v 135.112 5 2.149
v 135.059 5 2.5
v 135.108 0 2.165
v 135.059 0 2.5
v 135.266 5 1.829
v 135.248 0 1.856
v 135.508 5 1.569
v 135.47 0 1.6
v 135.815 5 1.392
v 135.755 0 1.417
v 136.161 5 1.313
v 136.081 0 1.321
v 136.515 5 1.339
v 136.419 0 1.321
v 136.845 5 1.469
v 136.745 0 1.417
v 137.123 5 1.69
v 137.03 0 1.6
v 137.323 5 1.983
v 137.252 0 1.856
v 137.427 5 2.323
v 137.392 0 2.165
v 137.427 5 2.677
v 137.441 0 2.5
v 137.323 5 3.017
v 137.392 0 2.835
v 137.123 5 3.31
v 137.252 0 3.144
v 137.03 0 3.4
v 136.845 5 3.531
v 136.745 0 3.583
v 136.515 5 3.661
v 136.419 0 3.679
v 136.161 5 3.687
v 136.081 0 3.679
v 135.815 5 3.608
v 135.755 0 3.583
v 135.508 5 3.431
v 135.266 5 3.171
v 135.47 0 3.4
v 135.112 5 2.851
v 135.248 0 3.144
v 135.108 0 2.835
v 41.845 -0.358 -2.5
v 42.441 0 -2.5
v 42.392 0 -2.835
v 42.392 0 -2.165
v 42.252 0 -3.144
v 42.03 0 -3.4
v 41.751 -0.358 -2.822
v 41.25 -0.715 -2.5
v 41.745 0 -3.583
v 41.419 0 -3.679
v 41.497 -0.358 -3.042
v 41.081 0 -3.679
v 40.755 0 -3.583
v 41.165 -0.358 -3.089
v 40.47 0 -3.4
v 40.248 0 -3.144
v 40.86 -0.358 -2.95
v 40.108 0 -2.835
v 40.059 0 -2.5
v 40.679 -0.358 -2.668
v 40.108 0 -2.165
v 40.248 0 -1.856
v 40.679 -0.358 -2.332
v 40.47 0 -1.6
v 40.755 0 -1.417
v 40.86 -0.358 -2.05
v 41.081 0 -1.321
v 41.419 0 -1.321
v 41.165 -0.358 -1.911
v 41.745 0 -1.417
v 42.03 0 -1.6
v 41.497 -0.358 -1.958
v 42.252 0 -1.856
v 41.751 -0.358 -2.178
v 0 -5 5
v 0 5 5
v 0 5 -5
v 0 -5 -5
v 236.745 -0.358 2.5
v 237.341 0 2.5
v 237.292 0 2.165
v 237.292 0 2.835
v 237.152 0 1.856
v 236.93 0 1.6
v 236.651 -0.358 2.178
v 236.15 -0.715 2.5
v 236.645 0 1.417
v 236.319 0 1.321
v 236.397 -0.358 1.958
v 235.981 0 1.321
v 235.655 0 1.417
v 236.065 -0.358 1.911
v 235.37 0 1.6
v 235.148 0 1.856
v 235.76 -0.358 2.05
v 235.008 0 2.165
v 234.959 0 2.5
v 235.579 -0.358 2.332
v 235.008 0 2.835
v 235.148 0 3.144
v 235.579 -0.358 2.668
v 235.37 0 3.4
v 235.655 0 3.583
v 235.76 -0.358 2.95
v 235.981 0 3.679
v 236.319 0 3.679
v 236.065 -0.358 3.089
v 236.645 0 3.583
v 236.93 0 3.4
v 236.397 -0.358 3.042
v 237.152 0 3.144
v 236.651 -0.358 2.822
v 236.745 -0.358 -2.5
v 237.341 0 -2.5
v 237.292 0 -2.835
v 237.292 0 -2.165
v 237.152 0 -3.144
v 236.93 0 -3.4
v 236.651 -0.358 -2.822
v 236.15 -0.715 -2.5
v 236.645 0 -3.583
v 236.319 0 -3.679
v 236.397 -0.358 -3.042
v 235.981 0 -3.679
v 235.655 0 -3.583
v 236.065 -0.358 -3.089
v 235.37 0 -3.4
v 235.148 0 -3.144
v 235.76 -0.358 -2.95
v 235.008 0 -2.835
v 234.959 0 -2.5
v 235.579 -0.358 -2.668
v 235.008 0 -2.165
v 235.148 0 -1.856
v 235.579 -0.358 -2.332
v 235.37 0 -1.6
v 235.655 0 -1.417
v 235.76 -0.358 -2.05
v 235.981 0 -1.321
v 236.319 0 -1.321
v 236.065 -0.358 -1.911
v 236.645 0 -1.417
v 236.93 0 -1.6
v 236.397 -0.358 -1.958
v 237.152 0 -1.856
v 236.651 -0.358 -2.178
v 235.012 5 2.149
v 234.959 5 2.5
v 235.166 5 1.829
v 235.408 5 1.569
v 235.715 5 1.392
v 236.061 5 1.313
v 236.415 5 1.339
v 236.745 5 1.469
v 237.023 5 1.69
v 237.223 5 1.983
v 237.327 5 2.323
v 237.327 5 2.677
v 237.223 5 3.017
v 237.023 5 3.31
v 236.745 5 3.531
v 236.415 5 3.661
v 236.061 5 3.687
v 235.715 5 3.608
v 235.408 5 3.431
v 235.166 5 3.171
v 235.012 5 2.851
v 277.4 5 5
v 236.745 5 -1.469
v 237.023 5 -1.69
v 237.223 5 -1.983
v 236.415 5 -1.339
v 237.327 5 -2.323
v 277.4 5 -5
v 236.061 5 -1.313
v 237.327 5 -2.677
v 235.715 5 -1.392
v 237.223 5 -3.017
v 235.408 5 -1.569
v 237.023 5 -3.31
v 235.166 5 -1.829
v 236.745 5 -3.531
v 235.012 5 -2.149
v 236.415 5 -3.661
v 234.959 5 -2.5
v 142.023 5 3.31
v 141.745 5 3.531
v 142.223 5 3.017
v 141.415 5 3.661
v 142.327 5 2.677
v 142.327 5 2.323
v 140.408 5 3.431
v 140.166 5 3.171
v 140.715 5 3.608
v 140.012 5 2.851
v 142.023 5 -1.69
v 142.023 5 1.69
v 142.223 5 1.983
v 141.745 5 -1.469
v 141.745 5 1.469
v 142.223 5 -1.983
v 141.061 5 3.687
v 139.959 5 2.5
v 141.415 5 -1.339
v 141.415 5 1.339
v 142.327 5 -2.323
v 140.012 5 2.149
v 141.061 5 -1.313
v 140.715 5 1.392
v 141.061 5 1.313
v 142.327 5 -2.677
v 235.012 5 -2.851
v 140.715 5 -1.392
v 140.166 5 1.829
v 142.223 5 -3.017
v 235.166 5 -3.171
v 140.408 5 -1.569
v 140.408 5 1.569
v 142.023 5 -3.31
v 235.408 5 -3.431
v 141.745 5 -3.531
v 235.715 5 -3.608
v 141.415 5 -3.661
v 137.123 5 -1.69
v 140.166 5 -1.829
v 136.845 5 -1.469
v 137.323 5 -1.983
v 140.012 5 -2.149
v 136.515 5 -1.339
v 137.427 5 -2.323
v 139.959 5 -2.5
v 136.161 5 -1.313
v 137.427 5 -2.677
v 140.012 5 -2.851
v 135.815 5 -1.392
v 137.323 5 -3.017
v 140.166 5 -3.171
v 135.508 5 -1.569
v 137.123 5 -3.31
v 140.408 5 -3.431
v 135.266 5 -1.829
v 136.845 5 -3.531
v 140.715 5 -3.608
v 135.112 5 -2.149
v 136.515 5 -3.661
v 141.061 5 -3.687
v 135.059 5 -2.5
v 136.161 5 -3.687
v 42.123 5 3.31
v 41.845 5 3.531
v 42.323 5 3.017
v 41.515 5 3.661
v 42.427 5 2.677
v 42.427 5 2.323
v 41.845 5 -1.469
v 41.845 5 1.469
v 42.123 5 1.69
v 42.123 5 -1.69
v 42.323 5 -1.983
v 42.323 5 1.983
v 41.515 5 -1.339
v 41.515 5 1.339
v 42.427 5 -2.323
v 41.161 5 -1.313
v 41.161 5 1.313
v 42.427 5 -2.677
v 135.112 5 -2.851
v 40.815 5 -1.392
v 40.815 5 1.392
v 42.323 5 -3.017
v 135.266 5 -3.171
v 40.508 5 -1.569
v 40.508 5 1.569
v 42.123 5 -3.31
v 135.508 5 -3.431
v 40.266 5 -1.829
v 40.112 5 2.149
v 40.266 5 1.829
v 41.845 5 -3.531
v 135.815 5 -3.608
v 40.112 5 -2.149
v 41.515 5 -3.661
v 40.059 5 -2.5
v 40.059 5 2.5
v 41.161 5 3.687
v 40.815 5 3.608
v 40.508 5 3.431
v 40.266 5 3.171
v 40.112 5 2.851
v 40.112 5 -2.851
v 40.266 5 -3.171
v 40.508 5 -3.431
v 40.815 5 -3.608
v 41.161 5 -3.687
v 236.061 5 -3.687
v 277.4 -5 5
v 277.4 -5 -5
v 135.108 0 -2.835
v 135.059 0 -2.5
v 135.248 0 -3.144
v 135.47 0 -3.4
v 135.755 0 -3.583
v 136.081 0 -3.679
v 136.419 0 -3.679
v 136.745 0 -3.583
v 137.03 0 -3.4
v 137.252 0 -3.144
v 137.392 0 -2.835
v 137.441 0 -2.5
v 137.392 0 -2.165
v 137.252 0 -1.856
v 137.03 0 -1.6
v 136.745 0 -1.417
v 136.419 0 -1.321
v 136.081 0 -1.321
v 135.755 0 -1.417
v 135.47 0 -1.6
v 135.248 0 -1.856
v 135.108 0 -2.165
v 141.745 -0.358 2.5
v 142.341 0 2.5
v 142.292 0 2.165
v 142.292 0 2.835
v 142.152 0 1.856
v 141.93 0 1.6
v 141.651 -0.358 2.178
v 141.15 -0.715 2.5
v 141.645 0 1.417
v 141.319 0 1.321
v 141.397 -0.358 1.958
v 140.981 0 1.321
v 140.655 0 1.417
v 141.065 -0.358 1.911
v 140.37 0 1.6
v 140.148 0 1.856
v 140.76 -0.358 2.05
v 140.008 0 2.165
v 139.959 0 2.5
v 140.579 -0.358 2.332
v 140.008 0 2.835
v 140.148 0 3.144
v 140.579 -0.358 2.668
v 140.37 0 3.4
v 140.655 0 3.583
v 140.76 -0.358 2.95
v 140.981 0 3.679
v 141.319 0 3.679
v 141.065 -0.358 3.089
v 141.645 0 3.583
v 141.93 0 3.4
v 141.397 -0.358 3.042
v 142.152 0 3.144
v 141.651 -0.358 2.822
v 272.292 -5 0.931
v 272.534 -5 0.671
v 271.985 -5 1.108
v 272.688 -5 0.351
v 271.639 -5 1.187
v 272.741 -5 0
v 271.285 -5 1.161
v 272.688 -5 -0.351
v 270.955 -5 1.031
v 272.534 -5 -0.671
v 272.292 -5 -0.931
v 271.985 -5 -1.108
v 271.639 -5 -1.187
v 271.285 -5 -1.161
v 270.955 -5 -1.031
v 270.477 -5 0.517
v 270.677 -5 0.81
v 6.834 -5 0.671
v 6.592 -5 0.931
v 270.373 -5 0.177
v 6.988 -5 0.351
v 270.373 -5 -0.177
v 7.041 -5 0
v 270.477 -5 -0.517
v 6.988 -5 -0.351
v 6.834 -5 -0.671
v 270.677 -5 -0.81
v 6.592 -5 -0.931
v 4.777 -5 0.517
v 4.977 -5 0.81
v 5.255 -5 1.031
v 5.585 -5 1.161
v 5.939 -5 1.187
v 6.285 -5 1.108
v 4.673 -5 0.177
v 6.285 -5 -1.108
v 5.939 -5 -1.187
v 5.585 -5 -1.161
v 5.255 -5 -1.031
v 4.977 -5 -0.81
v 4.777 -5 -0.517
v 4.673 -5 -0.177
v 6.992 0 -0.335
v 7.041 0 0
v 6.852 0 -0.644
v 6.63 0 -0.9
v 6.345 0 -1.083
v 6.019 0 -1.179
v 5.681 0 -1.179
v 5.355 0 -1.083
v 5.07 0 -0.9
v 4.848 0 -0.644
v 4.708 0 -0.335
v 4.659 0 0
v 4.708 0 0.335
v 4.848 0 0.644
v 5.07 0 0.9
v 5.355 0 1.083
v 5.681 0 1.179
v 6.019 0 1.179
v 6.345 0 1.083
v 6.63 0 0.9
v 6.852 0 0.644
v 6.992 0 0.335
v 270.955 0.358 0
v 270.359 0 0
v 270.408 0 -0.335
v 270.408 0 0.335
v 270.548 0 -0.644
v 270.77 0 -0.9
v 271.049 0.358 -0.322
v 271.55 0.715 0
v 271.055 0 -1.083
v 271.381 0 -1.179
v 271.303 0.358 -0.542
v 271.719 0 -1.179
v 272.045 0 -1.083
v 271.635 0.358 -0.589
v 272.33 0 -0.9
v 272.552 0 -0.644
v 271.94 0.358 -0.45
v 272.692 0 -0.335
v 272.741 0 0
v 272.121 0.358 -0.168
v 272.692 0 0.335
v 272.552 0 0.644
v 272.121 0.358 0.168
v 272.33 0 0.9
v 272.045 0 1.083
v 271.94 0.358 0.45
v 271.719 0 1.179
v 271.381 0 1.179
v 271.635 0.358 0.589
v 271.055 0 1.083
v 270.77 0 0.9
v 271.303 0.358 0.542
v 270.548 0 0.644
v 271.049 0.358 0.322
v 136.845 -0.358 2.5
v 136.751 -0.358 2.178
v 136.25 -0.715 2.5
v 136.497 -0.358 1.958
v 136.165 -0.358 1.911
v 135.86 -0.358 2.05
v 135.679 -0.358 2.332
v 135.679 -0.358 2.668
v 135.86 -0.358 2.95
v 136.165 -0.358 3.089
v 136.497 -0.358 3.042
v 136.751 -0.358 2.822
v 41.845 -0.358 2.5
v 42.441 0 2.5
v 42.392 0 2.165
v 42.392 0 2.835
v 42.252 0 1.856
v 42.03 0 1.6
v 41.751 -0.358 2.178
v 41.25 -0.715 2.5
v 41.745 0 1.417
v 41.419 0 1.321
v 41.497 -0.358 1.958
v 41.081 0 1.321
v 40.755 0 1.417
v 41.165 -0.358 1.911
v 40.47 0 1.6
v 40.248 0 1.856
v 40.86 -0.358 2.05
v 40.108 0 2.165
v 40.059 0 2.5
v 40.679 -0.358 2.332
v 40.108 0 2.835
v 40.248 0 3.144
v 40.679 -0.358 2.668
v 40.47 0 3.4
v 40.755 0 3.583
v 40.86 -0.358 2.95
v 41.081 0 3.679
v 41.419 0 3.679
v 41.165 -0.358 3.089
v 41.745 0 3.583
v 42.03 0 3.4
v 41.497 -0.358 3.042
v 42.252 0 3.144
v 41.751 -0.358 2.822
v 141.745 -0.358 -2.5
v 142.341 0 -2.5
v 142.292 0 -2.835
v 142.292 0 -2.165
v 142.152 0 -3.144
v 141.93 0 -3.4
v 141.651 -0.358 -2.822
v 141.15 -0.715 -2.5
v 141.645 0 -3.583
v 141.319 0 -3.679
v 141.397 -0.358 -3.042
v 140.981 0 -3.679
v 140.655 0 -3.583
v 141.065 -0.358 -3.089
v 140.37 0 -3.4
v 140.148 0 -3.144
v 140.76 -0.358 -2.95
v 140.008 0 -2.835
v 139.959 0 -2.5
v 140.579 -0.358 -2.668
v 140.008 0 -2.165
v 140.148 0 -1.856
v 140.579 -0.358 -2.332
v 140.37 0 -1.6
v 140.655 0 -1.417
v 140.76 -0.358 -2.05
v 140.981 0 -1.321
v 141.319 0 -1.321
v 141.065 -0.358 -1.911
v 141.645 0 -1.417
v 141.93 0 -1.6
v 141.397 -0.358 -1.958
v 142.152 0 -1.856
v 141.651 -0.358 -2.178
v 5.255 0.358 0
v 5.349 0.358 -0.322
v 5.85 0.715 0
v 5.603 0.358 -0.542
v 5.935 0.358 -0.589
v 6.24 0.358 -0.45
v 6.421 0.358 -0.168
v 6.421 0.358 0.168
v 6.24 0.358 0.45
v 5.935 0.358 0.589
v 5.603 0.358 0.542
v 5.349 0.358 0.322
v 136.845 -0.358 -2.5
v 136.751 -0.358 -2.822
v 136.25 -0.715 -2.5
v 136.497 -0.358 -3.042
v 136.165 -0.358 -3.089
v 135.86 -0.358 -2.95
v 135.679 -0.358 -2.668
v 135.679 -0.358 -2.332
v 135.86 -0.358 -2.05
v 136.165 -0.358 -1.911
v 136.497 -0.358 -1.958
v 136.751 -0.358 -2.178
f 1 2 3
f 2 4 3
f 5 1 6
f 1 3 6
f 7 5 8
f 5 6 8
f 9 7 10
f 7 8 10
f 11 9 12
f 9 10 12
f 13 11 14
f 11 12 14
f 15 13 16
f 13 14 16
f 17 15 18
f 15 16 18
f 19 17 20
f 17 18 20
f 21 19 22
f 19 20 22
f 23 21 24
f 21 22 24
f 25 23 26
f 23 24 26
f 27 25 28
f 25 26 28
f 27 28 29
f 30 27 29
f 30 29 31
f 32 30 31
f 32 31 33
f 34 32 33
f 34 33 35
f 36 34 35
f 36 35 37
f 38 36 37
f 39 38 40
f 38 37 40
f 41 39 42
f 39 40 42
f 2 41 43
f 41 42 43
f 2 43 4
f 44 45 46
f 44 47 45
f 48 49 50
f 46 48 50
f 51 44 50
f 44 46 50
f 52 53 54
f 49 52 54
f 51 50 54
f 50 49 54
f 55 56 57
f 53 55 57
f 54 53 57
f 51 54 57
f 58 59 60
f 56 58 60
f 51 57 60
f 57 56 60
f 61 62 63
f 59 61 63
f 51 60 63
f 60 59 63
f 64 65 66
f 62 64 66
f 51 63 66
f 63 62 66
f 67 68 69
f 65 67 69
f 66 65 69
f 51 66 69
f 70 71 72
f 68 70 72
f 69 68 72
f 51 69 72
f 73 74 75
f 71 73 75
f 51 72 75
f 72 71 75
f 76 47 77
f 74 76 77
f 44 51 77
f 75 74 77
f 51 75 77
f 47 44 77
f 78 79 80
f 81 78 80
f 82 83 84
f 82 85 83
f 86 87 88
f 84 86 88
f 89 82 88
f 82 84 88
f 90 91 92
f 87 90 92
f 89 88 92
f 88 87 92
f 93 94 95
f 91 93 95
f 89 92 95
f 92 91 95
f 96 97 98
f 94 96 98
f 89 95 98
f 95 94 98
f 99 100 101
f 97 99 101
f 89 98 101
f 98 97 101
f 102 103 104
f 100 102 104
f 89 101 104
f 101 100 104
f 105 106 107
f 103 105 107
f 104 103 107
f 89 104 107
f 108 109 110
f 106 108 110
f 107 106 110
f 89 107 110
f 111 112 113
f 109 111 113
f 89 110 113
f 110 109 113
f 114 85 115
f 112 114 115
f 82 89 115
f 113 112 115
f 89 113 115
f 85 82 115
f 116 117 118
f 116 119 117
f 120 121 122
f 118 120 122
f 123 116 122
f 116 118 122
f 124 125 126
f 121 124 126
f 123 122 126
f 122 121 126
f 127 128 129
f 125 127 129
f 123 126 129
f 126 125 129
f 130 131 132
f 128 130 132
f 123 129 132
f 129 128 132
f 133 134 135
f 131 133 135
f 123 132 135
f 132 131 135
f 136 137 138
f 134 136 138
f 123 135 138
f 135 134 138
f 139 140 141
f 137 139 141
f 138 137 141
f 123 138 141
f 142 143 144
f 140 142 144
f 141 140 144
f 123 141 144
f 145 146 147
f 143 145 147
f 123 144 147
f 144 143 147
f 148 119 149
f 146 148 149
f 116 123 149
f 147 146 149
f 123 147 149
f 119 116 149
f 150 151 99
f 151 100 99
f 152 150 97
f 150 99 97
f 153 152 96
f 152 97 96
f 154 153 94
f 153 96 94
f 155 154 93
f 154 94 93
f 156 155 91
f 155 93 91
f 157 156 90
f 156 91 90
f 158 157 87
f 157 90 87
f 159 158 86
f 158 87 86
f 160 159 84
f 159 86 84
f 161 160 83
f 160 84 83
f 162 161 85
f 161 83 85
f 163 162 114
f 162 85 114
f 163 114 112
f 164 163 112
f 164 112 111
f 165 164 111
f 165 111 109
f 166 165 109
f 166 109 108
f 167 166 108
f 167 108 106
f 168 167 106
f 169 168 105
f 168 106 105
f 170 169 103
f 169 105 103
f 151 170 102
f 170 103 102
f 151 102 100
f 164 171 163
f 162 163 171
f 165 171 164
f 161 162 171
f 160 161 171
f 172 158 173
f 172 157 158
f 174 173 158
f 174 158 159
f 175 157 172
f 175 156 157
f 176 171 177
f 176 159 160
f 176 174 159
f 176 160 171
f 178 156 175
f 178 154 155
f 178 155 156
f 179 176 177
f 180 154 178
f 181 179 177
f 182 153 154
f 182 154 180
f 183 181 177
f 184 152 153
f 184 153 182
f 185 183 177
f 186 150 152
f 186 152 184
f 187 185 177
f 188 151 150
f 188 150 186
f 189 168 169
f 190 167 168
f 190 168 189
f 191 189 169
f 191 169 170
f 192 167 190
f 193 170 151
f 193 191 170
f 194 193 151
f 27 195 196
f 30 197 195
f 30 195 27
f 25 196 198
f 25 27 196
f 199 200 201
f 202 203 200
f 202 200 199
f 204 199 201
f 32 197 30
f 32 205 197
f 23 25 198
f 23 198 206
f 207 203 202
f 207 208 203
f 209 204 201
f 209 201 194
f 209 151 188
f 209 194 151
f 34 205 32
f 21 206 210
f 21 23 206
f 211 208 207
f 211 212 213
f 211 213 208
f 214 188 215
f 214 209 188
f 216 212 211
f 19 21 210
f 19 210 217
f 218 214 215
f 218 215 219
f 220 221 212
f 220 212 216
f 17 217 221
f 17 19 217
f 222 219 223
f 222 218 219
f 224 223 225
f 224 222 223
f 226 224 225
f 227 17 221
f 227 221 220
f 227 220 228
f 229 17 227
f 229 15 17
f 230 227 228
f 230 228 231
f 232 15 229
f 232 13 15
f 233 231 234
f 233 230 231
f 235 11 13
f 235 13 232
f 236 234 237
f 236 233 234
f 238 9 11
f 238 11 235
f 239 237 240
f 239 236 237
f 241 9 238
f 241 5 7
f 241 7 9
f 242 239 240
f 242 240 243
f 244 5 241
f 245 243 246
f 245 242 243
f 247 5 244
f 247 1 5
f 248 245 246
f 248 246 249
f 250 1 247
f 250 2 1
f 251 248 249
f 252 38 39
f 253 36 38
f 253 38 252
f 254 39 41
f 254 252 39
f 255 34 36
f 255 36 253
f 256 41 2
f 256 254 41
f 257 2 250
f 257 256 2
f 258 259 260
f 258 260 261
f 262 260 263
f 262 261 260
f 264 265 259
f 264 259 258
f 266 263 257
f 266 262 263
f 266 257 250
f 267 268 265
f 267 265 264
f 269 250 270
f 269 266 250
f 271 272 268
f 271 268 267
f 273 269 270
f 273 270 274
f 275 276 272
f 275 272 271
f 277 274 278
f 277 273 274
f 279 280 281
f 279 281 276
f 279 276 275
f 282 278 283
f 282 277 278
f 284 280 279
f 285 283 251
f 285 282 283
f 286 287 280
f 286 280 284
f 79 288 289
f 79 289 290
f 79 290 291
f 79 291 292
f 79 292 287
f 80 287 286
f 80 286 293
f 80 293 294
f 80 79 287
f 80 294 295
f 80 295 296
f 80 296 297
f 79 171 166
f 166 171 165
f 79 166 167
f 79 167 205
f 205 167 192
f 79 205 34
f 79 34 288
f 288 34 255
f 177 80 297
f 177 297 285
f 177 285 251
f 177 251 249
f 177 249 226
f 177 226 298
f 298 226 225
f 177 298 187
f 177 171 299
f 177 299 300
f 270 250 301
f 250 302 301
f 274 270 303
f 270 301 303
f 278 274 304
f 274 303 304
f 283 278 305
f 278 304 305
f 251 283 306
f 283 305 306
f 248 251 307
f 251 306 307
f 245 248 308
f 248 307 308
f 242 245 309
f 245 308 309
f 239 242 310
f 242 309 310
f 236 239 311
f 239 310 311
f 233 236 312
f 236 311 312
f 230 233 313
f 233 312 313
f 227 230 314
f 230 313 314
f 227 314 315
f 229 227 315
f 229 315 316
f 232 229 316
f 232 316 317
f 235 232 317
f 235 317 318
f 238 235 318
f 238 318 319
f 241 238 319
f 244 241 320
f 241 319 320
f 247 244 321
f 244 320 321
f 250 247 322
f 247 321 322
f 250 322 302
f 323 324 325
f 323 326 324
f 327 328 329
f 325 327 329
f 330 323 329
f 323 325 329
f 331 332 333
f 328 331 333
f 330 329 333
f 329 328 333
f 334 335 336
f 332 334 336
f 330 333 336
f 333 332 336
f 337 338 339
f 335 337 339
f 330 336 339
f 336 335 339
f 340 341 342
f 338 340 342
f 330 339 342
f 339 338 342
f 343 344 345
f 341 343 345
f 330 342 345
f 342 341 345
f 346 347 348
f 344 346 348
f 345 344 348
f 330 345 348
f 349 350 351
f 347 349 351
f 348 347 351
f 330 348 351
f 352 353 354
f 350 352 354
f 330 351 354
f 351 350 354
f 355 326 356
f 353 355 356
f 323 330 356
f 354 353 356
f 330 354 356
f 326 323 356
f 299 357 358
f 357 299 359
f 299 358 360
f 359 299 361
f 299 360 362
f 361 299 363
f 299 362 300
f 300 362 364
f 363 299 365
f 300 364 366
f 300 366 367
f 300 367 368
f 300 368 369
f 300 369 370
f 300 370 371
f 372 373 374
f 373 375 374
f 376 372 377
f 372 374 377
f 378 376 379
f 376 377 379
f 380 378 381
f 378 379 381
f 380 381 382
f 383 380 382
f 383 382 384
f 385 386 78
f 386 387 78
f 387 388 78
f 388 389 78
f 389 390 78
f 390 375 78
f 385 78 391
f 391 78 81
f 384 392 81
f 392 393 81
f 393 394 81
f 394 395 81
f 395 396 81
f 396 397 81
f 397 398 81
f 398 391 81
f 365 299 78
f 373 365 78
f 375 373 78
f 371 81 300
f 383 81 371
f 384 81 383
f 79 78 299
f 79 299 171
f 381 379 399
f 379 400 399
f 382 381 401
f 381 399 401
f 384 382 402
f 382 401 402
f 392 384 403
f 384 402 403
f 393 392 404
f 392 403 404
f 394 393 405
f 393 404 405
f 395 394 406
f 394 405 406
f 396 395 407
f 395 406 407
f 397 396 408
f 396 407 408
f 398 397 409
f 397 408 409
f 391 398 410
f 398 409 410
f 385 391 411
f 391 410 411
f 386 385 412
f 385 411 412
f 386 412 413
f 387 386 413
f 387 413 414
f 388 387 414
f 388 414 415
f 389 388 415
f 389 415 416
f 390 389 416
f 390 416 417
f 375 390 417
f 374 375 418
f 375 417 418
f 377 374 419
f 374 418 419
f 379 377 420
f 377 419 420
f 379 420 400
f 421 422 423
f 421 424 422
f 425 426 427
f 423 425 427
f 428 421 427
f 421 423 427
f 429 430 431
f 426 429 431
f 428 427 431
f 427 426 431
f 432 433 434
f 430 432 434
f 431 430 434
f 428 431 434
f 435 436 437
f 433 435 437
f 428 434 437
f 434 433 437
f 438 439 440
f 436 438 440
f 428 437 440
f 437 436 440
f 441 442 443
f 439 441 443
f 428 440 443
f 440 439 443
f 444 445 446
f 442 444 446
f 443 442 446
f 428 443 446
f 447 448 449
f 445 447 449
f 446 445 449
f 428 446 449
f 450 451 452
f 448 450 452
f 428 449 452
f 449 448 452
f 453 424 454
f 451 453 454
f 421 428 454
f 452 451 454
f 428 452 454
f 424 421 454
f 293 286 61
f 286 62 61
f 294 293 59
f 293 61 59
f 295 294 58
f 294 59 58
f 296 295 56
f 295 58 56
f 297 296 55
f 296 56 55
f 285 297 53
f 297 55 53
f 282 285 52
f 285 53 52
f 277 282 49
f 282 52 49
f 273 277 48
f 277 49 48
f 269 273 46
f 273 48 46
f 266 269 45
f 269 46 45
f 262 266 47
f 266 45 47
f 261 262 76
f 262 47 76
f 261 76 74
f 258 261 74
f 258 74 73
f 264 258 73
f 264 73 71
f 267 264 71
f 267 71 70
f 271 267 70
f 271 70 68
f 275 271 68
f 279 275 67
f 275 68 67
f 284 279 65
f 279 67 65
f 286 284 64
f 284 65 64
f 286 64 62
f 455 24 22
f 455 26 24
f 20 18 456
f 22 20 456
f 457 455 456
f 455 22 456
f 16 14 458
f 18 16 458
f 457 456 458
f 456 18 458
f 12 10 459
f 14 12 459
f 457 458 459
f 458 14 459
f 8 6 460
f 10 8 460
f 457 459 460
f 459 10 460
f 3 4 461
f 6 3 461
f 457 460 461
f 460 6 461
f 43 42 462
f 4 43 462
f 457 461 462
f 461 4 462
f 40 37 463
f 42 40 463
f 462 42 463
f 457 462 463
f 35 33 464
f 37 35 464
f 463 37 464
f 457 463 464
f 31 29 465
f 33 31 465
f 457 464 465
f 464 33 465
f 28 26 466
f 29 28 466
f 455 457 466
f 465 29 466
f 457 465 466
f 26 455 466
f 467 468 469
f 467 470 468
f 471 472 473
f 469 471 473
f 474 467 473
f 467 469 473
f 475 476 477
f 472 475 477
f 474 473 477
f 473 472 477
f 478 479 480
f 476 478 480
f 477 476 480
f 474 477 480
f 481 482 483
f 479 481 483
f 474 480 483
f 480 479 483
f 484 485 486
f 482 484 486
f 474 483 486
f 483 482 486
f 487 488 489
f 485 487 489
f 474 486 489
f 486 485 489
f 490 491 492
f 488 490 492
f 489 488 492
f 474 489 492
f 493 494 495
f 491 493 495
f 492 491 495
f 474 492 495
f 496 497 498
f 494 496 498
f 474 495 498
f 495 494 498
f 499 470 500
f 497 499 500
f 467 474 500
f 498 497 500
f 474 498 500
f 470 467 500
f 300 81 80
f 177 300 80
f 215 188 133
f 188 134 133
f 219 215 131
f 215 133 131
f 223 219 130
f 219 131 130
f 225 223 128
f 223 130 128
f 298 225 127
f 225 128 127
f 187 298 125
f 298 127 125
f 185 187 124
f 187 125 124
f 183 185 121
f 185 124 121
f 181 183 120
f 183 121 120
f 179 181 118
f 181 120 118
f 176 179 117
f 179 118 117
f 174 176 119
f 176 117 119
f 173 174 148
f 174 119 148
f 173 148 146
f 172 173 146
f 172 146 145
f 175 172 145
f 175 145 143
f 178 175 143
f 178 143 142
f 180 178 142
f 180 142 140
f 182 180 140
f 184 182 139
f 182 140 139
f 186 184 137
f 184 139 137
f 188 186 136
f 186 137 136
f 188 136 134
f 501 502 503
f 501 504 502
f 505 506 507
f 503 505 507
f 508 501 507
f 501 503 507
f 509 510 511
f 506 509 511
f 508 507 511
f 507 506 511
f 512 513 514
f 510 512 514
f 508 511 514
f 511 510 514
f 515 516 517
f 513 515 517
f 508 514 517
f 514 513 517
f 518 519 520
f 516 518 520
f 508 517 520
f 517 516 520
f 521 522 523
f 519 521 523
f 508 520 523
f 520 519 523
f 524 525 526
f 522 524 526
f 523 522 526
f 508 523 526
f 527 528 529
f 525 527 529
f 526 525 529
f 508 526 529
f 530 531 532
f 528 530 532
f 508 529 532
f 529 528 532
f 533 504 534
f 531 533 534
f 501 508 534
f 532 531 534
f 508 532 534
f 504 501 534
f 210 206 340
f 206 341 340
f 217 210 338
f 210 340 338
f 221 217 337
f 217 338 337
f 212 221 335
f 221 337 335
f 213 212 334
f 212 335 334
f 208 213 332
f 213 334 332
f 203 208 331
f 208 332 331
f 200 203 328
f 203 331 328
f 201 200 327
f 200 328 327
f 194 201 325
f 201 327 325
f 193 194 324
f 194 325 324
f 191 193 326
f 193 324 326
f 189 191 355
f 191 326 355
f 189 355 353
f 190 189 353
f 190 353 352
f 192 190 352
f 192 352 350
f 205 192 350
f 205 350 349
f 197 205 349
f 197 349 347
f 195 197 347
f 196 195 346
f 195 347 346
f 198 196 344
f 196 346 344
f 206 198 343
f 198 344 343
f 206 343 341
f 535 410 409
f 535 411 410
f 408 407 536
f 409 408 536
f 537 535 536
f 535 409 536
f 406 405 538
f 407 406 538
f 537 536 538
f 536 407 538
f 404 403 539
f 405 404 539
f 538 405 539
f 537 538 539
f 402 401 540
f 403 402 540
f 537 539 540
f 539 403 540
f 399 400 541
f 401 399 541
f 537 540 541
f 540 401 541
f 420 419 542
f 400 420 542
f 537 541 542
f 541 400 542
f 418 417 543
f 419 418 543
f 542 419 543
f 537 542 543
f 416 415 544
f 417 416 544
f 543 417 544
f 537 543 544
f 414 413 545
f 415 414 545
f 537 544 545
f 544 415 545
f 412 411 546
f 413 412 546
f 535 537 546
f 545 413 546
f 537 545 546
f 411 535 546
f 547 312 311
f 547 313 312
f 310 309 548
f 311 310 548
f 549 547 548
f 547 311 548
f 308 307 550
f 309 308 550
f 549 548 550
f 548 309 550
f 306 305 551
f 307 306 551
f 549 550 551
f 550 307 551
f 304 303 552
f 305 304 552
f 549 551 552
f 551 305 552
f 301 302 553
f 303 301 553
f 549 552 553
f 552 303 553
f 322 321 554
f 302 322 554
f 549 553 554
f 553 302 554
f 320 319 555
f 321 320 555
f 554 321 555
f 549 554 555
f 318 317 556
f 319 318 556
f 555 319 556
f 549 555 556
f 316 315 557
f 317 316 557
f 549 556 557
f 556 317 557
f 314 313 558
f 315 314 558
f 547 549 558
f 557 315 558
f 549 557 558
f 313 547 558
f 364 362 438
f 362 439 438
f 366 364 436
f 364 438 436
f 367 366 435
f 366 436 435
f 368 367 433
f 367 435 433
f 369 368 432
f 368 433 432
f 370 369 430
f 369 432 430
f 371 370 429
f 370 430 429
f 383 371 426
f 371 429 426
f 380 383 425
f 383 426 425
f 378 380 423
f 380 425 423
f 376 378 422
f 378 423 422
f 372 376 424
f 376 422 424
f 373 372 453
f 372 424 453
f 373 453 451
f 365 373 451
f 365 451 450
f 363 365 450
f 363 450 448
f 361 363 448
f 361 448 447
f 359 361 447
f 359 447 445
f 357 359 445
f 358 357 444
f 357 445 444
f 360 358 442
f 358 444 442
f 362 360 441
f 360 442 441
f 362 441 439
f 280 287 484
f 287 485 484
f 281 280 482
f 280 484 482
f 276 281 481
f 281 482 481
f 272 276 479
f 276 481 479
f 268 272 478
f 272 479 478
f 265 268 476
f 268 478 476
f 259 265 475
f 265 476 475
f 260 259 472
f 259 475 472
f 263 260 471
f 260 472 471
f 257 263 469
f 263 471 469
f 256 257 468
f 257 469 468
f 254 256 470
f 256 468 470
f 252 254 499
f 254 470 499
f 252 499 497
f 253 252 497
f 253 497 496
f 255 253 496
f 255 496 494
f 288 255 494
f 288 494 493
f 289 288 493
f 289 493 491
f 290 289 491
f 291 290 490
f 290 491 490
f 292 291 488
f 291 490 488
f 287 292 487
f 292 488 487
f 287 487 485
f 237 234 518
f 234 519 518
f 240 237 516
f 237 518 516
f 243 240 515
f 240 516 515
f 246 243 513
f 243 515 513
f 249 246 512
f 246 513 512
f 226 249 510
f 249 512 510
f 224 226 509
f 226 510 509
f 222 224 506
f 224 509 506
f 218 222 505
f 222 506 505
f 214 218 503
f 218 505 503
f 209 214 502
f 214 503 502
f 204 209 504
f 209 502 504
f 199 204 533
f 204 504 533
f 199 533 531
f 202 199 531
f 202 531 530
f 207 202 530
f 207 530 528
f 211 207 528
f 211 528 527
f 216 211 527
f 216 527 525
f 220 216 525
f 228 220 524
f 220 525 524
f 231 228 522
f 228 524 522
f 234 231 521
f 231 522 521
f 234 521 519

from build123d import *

# Parameters (mm, degrees)
SKETCH2_W                           = 10
SKETCH2_H                           = 10
BOSS_EXTRUDE1_DEPTH                 = 277.4
F_3_32_0_09375_DIAMETER_HOLE3_D     = 2.38125
F_3_32_0_09375_DIAMETER_HOLE3_DEPTH = 5
F_3_32_0_09375_DIAMETER_HOLE3_TIP   = 0.715399675
F_3_32_0_09375_DIAMETER_HOLE5_D     = 2.38125
F_3_32_0_09375_DIAMETER_HOLE5_DEPTH = 5
F_3_32_0_09375_DIAMETER_HOLE5_TIP   = 0.715399675


with BuildPart() as part:
    # Sketch2 → Boss-Extrude1 (new body)
    with BuildSketch(Plane(origin=(0, 0, 0), x_dir=(0, 0, -1), z_dir=(1, 0, 0))):
        Rectangle(SKETCH2_W, SKETCH2_H)
    extrude(amount=BOSS_EXTRUDE1_DEPTH)

    # 3/32 (0.09375) Diameter Hole3
    with Locations(Plane(origin=(0, -5, 0), x_dir=(-1, 0, 0), z_dir=(0, -1, 0))):
        with Locations((-5.85, 0), (-271.55, 0)):
            Hole(F_3_32_0_09375_DIAMETER_HOLE3_D / 2, depth=F_3_32_0_09375_DIAMETER_HOLE3_DEPTH)
            with Locations((0, 0, -(F_3_32_0_09375_DIAMETER_HOLE3_DEPTH + F_3_32_0_09375_DIAMETER_HOLE3_TIP / 2))):  # 118° drill point
                Cone(0, F_3_32_0_09375_DIAMETER_HOLE3_D / 2, F_3_32_0_09375_DIAMETER_HOLE3_TIP, mode=Mode.SUBTRACT)

    # 3/32 (0.09375) Diameter Hole5
    with Locations(Plane(origin=(0, 5, 0), x_dir=(1, 0, 0), z_dir=(0, 1, 0))):
        with Locations((41.25, 2.5), (41.25, -2.5), (136.25, 2.5), (136.25, -2.5), (141.15, -2.5), (141.15, 2.5), (236.15, -2.5), (236.15, 2.5)):
            Hole(F_3_32_0_09375_DIAMETER_HOLE5_D / 2, depth=F_3_32_0_09375_DIAMETER_HOLE5_DEPTH)
            with Locations((0, 0, -(F_3_32_0_09375_DIAMETER_HOLE5_DEPTH + F_3_32_0_09375_DIAMETER_HOLE5_TIP / 2))):  # 118° drill point
                Cone(0, F_3_32_0_09375_DIAMETER_HOLE5_D / 2, F_3_32_0_09375_DIAMETER_HOLE5_TIP, mode=Mode.SUBTRACT)


solid = part.part
